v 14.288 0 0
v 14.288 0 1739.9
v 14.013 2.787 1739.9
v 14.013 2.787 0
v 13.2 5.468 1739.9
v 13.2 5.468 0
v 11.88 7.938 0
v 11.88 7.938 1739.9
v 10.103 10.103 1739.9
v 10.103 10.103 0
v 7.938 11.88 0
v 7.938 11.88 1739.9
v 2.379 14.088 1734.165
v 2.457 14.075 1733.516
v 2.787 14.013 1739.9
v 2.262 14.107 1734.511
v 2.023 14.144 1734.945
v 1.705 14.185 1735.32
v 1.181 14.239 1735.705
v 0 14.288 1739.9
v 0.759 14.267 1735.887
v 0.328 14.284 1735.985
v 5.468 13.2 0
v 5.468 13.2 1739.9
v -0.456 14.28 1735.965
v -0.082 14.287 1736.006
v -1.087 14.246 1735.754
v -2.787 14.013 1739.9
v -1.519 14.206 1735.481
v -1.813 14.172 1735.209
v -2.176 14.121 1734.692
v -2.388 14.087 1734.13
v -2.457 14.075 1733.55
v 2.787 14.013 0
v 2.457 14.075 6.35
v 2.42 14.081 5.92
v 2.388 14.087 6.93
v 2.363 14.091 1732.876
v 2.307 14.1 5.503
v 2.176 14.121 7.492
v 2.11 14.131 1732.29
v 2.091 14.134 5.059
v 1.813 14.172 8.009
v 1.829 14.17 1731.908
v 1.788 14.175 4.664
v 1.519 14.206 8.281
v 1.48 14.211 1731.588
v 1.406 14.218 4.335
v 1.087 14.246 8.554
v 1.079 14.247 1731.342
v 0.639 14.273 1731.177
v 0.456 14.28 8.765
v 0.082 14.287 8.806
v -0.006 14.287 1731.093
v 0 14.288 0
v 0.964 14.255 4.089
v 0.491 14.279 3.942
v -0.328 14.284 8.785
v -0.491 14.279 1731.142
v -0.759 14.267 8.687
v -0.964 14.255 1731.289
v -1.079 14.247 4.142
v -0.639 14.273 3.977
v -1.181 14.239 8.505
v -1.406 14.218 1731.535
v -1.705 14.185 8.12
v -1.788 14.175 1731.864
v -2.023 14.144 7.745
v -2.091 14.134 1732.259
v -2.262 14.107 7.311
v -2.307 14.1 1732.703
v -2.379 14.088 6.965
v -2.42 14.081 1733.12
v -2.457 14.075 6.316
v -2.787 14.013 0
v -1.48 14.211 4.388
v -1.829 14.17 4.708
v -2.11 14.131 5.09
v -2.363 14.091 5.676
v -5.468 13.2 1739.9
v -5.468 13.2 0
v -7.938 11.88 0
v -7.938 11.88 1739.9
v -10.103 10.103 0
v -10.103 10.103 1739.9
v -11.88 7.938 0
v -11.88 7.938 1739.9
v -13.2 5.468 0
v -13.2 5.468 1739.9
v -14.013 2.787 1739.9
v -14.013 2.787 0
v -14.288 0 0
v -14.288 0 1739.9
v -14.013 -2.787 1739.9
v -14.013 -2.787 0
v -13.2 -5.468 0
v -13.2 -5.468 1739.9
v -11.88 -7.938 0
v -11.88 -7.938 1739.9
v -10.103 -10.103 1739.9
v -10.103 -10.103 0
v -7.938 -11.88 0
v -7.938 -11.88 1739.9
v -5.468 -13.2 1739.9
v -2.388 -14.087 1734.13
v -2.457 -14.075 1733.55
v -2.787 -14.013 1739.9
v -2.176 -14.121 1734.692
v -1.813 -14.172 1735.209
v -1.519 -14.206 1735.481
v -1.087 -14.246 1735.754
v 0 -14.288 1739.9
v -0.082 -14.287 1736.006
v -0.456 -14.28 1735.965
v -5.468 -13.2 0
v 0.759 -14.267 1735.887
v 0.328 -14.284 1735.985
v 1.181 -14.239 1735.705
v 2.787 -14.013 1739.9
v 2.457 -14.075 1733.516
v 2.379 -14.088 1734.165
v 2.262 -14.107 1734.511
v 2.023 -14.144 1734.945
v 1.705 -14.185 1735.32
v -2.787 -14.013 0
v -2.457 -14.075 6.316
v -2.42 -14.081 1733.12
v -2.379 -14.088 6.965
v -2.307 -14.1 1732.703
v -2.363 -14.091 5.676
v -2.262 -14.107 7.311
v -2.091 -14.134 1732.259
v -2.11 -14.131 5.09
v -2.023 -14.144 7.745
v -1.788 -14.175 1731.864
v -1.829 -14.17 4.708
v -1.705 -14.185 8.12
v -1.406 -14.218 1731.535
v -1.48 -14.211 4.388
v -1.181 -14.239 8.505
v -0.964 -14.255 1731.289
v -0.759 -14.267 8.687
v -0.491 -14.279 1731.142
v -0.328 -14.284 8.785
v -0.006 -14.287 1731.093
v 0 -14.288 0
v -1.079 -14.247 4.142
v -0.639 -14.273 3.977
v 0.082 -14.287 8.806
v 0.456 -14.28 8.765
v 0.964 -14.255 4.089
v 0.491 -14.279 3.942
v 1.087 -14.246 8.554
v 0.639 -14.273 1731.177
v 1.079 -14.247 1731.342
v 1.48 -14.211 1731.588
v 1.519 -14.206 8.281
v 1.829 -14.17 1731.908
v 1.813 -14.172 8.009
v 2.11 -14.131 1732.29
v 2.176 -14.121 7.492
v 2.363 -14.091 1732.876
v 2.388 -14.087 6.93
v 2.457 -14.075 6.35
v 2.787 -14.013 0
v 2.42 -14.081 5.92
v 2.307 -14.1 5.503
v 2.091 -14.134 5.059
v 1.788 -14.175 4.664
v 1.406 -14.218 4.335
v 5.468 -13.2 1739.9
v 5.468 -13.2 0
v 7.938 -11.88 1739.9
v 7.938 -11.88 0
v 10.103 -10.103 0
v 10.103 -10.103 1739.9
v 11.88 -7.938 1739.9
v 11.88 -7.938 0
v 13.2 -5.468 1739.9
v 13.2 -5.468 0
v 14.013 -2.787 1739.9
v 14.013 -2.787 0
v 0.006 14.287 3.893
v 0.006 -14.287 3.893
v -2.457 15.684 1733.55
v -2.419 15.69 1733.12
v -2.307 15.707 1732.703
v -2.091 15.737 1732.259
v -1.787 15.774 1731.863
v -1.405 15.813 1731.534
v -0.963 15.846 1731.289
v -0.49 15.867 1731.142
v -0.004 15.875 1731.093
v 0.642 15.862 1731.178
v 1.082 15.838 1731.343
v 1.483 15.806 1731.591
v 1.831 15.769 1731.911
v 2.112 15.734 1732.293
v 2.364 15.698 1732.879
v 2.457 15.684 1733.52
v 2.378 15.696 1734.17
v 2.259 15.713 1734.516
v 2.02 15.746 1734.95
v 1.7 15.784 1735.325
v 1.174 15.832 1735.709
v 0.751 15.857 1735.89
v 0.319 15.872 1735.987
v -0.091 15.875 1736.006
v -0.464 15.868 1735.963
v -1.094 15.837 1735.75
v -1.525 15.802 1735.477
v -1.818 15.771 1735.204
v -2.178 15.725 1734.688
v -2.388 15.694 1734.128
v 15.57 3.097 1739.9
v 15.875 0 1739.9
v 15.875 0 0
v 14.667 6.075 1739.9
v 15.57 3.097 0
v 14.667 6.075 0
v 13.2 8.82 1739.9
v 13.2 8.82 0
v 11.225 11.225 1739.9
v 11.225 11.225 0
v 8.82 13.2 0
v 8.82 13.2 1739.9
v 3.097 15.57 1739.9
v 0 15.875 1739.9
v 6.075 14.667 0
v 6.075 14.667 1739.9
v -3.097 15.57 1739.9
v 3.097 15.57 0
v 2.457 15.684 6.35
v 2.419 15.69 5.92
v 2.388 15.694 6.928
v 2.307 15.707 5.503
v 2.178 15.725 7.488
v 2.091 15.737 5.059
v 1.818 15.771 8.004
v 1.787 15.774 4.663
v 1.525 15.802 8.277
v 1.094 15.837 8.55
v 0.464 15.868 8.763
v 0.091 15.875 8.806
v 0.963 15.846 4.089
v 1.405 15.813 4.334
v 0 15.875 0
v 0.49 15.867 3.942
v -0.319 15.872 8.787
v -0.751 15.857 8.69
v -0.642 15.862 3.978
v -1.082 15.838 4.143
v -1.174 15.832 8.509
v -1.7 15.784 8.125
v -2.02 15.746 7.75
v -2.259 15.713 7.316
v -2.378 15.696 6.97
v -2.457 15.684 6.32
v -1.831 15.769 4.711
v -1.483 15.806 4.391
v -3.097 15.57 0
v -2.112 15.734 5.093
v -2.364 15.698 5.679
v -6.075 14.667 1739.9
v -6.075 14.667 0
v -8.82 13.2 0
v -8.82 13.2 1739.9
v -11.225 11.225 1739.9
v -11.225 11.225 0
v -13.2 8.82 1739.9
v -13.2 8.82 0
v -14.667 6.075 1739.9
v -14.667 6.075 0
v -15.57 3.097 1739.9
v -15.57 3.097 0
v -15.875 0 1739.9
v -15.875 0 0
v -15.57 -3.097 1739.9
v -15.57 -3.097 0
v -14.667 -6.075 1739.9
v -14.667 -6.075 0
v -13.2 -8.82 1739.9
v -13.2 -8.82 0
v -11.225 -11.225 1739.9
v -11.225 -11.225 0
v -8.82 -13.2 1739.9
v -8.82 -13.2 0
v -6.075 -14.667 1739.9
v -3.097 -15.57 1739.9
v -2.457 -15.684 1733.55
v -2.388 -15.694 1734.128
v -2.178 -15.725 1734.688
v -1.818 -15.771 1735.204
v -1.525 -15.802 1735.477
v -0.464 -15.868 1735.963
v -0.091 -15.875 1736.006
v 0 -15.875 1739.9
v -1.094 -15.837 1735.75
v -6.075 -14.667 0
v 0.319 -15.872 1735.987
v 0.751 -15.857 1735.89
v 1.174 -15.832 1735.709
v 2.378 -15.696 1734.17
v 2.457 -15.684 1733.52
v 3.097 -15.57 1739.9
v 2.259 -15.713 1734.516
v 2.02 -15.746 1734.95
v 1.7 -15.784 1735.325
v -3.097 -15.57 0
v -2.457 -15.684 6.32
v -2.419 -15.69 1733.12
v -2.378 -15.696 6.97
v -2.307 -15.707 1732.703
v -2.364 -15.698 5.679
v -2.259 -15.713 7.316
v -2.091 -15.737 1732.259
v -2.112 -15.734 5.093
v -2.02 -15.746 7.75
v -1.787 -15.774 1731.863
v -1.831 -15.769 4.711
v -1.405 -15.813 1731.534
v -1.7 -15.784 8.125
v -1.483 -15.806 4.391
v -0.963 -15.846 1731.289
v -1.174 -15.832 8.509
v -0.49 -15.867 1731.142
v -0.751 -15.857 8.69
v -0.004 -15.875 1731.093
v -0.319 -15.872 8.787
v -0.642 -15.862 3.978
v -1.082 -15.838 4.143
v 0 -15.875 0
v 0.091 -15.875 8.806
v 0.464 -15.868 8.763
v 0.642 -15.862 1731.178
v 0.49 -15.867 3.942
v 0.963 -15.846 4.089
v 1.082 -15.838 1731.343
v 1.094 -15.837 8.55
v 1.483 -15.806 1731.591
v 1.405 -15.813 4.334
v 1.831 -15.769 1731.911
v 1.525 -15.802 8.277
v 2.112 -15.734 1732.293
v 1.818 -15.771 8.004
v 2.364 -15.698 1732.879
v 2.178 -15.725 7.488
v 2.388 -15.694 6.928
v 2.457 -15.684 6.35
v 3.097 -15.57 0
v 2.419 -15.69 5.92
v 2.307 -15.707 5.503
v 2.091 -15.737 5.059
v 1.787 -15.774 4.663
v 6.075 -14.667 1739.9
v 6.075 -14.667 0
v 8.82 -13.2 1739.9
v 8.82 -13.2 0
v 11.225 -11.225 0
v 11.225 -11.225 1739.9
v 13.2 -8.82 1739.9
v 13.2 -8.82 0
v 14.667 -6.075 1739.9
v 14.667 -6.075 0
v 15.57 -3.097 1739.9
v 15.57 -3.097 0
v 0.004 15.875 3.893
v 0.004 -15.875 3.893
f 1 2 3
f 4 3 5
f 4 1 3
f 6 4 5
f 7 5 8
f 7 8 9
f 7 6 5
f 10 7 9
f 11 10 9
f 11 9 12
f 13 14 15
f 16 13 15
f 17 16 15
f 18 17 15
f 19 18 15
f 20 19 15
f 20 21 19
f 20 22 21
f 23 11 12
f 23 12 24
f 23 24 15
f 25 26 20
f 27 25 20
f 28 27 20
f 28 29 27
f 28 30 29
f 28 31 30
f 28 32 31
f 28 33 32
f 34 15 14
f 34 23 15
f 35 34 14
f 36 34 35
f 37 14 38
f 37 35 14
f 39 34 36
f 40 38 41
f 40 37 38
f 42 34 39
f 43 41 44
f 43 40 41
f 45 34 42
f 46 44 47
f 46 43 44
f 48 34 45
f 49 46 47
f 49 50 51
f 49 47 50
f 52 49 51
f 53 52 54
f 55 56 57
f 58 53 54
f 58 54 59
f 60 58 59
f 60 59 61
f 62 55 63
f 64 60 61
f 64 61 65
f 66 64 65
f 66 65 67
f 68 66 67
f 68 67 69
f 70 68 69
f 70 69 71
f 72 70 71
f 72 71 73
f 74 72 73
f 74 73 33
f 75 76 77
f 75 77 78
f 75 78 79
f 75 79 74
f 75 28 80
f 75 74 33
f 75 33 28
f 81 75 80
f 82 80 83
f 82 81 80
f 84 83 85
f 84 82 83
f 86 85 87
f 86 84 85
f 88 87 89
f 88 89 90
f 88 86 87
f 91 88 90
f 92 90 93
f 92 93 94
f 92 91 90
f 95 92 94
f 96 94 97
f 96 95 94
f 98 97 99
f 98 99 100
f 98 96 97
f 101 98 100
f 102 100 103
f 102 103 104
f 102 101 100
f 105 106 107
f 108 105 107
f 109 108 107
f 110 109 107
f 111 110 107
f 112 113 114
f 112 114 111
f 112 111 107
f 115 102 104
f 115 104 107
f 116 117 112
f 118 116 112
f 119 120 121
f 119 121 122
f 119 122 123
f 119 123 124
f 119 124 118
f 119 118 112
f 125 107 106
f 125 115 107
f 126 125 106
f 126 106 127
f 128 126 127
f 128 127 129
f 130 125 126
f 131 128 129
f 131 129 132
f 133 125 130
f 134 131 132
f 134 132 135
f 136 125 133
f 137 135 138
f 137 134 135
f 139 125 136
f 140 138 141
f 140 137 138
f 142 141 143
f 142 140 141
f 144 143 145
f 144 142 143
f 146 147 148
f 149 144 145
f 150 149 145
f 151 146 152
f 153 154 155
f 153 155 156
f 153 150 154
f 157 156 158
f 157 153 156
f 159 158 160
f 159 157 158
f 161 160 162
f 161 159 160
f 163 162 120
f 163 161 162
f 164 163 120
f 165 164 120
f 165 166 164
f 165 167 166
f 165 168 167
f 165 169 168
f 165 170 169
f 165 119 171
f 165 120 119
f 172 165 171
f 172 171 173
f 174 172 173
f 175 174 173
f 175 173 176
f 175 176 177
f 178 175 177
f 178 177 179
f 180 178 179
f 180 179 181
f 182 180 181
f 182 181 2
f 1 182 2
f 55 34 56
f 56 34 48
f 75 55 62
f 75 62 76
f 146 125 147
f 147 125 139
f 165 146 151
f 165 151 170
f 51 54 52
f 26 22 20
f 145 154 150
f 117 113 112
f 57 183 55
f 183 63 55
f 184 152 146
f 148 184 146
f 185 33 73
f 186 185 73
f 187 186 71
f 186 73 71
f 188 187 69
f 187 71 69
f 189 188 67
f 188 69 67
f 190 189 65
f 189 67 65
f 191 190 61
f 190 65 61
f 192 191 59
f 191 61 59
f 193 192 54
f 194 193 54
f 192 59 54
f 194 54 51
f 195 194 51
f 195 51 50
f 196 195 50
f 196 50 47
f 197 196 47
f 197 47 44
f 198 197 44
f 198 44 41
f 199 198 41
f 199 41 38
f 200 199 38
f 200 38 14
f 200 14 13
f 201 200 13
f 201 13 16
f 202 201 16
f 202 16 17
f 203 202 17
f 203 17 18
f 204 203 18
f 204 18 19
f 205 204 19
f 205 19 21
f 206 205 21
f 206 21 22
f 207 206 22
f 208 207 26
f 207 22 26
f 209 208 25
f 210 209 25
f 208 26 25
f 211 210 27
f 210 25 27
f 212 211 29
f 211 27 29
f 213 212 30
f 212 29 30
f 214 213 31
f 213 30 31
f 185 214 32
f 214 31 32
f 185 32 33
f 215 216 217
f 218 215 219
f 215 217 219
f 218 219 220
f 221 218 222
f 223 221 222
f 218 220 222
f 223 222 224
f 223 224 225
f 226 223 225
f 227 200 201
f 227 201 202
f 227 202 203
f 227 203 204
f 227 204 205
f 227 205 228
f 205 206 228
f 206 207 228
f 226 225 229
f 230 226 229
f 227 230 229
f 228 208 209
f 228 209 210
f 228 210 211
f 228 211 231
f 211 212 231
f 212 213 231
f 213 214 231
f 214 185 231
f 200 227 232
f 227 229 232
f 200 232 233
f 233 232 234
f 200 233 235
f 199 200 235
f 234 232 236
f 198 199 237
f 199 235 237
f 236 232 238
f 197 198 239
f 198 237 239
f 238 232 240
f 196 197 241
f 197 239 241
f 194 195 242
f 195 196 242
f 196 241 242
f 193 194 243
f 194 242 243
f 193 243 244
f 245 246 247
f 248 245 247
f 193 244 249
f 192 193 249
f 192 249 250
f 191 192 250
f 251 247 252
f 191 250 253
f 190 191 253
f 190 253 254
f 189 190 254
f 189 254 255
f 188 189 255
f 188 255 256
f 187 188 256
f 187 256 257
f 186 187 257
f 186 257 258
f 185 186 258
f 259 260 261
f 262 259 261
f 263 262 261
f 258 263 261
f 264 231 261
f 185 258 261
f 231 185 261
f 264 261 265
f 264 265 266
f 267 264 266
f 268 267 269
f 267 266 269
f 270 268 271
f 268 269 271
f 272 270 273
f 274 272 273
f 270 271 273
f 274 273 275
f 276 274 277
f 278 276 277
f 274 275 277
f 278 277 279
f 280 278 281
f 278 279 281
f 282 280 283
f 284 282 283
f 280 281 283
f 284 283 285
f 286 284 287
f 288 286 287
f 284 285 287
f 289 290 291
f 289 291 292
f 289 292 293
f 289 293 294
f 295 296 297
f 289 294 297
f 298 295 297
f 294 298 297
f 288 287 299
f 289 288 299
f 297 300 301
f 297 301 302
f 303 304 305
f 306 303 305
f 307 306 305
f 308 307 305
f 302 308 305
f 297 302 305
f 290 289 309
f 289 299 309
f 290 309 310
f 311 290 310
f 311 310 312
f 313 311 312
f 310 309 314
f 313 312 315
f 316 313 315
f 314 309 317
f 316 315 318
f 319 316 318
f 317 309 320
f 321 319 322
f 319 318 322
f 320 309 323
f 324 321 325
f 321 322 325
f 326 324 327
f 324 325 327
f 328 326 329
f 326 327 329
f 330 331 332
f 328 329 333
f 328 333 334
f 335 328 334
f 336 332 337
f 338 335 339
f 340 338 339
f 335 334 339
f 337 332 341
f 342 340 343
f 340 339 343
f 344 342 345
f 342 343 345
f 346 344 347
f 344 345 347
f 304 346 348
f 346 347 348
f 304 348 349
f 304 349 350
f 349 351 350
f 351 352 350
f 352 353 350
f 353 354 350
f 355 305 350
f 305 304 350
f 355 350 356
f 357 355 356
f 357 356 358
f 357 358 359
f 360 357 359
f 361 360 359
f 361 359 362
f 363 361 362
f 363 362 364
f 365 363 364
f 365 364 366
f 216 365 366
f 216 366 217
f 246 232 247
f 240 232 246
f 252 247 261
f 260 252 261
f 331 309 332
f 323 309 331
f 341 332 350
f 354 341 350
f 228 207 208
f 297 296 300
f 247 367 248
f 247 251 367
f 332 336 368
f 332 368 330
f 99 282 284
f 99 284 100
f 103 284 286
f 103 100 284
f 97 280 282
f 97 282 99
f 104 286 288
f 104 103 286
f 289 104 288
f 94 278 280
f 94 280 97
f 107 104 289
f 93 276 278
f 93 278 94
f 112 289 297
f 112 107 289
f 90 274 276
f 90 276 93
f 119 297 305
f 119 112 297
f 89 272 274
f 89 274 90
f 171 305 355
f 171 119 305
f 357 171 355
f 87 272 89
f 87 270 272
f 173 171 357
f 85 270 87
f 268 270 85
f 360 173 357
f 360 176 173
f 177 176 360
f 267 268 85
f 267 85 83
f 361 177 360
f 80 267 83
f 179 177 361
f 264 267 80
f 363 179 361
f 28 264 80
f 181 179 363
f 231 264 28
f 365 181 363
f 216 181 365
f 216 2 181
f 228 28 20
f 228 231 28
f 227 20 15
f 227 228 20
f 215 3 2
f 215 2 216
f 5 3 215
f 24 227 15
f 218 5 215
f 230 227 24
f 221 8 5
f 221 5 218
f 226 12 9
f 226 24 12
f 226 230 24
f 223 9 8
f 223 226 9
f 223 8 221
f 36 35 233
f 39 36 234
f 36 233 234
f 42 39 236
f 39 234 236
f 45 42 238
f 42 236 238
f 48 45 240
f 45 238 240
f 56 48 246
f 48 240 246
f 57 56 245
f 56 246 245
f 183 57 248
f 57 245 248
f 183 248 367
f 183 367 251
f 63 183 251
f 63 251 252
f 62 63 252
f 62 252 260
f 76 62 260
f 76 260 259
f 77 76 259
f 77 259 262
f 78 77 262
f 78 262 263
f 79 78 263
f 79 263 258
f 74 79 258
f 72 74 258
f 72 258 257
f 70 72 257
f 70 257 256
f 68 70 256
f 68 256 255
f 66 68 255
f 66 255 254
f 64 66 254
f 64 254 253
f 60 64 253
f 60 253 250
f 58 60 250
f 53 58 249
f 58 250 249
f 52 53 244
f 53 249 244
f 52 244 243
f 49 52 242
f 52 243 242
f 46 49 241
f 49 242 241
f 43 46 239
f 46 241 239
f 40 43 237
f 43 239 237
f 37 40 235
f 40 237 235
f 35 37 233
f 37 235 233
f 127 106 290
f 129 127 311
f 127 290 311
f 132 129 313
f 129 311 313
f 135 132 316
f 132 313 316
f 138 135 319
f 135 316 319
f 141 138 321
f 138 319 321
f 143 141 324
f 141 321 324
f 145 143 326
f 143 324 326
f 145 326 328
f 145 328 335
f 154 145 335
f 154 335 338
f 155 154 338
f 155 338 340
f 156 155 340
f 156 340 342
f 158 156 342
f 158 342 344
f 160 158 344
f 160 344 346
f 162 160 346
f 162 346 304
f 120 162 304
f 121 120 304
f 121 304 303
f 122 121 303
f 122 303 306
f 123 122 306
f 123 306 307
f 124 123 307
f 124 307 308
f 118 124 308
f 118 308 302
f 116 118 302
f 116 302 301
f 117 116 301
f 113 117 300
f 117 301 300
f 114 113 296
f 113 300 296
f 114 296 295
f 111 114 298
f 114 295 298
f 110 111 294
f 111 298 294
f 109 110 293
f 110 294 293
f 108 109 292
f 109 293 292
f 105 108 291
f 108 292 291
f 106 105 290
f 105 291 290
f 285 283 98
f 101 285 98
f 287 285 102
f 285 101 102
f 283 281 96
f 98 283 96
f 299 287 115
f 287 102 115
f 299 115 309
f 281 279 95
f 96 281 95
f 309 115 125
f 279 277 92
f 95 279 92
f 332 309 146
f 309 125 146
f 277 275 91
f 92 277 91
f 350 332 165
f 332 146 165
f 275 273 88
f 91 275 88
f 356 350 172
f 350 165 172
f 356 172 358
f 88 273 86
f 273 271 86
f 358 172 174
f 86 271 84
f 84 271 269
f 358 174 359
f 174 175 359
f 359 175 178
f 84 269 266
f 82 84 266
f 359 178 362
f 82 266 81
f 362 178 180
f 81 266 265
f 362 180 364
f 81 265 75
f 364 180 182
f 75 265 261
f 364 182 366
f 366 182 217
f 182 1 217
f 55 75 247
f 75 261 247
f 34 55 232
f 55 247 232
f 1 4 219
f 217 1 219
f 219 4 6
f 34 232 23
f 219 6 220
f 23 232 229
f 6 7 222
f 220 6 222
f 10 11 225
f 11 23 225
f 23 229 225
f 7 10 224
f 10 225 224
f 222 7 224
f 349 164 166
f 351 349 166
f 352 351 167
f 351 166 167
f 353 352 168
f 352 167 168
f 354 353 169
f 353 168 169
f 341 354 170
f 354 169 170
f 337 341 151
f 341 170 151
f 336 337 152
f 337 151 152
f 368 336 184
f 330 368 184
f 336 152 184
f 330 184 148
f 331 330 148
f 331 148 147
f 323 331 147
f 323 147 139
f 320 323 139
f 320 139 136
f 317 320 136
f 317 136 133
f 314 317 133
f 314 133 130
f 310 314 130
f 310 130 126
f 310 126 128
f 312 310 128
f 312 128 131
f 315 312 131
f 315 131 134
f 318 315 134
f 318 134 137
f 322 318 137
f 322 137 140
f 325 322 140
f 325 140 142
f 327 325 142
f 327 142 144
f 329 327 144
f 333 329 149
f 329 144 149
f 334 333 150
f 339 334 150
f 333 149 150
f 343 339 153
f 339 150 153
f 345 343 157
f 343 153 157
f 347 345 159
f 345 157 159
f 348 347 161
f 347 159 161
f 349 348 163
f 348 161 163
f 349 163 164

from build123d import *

# Parameters (mm, degrees)
SKETCH1_R                    = 15.875
SKETCH1_R_2                  = 14.2875
BOSS_EXTRUDE1_DEPTH          = 1739.9
F_10_0_1935_DIAMETER_HOLE1_D = 4.9149
F_10_0_1935_DIAMETER_HOLE2_D = 4.9149


with BuildPart() as part:
    # Sketch1 → Boss-Extrude1 (new body)
    with BuildSketch(Plane.XY):
        Circle(SKETCH1_R)
        Circle(SKETCH1_R_2, mode=Mode.SUBTRACT)
    extrude(amount=BOSS_EXTRUDE1_DEPTH)

    # #10 (0.1935) Diameter Hole1 (through all)
    with Locations(Plane(origin=(0, -15.875, 6.35), x_dir=(-1, 0, 0), z_dir=(0, -1, 0))):
        with Locations((0, 0)):
            Hole(F_10_0_1935_DIAMETER_HOLE1_D / 2)

    # #10 (0.1935) Diameter Hole2 (through all)
    with Locations(Plane(origin=(0, 15.875, 1733.55), x_dir=(1, 0, 0), z_dir=(0, 1, 0))):
        with Locations((0, 0)):
            Hole(F_10_0_1935_DIAMETER_HOLE2_D / 2)


solid = part.part
